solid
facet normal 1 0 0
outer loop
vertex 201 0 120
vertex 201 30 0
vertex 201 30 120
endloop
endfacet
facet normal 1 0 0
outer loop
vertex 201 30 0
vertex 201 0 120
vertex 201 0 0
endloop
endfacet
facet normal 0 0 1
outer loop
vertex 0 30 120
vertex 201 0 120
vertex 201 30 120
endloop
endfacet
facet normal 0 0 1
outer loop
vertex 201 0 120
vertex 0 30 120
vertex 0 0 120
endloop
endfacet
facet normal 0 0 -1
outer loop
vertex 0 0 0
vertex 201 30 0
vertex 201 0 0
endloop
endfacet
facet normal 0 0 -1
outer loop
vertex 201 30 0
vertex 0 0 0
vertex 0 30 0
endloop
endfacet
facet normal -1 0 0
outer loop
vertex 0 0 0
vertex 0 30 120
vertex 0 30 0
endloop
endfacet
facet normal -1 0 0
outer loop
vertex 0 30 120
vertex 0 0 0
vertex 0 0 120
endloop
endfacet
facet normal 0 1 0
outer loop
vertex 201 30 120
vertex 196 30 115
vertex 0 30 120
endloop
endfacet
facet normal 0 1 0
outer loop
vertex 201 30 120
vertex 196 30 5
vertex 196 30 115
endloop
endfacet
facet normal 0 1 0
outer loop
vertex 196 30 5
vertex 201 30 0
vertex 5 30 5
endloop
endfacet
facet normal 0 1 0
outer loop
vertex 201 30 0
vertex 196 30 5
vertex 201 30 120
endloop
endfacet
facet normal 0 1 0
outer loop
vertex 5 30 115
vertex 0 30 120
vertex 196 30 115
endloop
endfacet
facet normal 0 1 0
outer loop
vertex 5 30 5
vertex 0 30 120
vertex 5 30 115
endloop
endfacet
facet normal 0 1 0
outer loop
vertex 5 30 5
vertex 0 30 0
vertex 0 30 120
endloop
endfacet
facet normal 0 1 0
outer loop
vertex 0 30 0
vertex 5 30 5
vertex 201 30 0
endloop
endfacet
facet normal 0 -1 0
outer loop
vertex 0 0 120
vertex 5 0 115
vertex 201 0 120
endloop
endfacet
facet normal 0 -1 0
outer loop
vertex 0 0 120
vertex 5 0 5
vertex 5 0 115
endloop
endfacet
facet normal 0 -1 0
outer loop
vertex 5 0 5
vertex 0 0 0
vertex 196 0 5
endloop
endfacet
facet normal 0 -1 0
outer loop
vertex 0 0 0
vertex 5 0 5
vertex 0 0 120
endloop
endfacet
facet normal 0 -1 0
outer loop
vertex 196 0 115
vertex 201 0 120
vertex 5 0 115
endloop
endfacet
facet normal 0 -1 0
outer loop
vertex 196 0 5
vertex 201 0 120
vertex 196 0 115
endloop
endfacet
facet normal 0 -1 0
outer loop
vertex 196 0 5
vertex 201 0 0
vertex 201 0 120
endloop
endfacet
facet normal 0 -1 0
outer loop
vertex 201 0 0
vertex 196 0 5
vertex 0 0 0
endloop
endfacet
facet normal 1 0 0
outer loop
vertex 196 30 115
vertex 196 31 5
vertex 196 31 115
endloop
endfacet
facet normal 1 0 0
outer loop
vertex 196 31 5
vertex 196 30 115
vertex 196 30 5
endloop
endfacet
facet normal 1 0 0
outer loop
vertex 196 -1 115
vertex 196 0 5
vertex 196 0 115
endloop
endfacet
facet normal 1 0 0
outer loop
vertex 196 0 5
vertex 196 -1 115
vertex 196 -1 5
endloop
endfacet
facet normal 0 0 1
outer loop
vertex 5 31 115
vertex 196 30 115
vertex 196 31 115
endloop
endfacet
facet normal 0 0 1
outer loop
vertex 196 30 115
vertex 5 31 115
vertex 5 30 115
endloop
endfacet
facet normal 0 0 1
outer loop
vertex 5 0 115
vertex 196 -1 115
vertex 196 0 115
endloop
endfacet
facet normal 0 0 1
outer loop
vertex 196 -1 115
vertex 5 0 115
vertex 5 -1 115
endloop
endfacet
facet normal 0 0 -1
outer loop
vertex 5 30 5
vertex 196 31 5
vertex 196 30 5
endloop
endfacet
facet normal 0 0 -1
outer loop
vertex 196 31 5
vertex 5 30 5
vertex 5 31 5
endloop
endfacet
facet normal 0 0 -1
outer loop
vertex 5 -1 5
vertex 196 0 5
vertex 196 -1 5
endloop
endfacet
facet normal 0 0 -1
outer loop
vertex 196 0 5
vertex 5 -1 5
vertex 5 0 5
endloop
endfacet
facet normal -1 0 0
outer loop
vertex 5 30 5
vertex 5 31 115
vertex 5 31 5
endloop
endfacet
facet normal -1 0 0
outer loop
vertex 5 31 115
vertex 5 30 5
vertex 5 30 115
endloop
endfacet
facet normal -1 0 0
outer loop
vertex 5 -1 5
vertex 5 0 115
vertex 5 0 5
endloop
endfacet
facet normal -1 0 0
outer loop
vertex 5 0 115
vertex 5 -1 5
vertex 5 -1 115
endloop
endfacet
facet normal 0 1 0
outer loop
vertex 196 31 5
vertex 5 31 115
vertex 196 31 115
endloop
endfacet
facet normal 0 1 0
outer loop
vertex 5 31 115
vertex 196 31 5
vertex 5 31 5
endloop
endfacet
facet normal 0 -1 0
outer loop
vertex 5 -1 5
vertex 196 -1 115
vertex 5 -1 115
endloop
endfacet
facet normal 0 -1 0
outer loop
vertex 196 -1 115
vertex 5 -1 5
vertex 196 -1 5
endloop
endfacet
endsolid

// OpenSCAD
module window(width, height, depth, reveal) {
	blackberry = [ 102/255, 0/255, 102/255 ];
	transparent = [ 255/255, 255/255, 255/255 ];

	union() {
		color(blackberry)
		cube([width, depth, height]);
		
		color(transparent)
		translate([reveal, -1, reveal])
		cube([width - reveal * 2, depth + 2, height - reveal * 2]);
	}
}

window(201, 120, 30, 5);
